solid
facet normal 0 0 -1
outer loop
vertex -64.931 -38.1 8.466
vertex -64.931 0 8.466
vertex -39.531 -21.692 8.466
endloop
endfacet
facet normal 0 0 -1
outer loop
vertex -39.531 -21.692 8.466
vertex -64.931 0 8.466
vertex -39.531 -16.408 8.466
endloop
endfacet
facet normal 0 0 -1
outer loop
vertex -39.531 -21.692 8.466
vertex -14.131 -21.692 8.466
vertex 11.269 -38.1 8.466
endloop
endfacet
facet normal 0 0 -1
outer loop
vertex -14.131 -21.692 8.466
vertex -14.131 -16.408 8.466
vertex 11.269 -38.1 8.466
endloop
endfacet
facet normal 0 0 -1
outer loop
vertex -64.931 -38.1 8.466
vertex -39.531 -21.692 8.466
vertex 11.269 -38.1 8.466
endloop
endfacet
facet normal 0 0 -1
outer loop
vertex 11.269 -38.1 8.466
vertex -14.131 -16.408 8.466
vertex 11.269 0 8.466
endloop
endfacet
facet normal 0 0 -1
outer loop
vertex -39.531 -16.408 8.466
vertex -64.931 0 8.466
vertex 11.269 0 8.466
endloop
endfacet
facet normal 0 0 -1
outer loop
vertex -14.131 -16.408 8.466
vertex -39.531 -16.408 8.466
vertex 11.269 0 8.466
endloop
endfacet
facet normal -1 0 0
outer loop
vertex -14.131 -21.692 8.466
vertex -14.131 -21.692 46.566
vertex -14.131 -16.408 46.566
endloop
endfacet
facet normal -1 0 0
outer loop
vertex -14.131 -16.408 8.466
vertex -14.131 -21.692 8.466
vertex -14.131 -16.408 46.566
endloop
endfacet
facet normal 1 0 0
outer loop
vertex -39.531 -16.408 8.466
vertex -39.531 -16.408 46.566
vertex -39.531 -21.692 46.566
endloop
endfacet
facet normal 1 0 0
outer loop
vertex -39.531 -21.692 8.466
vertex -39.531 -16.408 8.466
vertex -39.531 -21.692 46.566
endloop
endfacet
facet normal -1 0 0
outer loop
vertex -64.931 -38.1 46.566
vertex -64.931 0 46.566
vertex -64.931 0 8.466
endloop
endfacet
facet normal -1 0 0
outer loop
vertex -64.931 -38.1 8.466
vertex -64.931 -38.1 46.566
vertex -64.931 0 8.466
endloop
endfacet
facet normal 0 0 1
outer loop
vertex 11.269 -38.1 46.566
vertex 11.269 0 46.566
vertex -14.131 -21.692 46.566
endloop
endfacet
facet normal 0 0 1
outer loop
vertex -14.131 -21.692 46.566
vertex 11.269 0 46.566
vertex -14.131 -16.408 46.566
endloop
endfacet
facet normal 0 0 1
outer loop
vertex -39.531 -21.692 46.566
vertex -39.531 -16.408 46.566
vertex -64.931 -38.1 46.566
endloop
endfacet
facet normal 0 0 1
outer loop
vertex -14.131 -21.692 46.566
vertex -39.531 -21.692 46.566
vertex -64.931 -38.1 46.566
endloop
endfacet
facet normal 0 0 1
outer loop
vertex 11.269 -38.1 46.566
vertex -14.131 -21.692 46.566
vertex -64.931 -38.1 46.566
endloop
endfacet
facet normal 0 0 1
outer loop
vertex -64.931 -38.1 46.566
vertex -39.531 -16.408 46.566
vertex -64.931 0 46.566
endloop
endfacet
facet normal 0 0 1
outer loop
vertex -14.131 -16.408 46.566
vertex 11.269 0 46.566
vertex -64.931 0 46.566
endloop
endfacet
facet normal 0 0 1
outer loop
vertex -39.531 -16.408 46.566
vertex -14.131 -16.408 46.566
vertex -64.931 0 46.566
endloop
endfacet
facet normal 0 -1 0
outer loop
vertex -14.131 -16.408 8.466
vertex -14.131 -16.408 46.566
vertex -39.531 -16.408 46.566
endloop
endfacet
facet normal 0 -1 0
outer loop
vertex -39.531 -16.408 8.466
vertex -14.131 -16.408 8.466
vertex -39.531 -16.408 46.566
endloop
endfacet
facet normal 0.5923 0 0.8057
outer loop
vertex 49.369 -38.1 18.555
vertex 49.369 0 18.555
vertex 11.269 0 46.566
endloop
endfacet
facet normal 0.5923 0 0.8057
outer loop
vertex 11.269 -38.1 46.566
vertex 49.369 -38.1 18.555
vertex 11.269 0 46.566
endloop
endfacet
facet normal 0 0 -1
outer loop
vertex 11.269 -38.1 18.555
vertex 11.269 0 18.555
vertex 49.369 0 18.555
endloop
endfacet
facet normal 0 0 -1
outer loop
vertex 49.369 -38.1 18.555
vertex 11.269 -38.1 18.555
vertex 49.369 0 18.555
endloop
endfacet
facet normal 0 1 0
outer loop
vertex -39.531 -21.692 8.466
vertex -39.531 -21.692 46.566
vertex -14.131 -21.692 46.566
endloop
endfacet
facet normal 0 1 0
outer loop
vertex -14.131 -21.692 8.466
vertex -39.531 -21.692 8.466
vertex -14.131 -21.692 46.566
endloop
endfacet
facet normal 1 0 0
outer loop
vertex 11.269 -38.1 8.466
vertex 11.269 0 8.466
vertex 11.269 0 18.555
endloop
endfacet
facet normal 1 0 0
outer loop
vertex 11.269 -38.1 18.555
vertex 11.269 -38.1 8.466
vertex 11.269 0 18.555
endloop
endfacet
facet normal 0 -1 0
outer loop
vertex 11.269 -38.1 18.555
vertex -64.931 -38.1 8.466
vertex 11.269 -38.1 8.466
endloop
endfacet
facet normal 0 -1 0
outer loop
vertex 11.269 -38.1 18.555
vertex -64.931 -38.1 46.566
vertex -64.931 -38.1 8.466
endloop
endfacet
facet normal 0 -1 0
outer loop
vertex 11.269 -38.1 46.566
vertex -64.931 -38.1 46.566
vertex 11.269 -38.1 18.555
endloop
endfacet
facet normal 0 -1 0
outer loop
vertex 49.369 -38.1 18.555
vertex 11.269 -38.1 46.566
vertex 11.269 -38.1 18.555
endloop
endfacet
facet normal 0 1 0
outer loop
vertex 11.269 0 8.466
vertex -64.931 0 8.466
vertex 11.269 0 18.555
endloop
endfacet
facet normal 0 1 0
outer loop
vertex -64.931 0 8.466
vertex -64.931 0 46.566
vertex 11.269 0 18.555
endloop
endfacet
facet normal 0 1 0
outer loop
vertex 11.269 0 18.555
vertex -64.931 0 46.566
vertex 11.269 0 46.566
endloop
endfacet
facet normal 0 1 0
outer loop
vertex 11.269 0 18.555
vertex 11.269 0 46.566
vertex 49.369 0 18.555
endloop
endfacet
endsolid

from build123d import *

# Parameters (mm, degrees)
F1_DEPTH = 38.1
F3_DEPTH = 38.1


with BuildPart() as f1:
    # F0 (on Front) → F1 (new body)
    with BuildSketch(Plane.XZ):
        Polygon((-64.931455, 8.465862), (11.268545, 8.465862), (11.268545, 18.554664), (49.368545, 18.554664), (11.268545, 46.565862), (-64.931455, 46.565862), align=None)
    extrude(amount=F1_DEPTH)

    # F2 (on face) → F3 (cut)
    with BuildSketch(Plane.XY.offset(46.565862)):
        Polygon((-39.531455, -21.6916), (-26.831455, -21.6916), (-14.131455, -21.6916), (-14.131455, -16.4084), (-39.531455, -16.4084), align=None)
    extrude(amount=-F3_DEPTH, mode=Mode.SUBTRACT)


solid = f1.part
